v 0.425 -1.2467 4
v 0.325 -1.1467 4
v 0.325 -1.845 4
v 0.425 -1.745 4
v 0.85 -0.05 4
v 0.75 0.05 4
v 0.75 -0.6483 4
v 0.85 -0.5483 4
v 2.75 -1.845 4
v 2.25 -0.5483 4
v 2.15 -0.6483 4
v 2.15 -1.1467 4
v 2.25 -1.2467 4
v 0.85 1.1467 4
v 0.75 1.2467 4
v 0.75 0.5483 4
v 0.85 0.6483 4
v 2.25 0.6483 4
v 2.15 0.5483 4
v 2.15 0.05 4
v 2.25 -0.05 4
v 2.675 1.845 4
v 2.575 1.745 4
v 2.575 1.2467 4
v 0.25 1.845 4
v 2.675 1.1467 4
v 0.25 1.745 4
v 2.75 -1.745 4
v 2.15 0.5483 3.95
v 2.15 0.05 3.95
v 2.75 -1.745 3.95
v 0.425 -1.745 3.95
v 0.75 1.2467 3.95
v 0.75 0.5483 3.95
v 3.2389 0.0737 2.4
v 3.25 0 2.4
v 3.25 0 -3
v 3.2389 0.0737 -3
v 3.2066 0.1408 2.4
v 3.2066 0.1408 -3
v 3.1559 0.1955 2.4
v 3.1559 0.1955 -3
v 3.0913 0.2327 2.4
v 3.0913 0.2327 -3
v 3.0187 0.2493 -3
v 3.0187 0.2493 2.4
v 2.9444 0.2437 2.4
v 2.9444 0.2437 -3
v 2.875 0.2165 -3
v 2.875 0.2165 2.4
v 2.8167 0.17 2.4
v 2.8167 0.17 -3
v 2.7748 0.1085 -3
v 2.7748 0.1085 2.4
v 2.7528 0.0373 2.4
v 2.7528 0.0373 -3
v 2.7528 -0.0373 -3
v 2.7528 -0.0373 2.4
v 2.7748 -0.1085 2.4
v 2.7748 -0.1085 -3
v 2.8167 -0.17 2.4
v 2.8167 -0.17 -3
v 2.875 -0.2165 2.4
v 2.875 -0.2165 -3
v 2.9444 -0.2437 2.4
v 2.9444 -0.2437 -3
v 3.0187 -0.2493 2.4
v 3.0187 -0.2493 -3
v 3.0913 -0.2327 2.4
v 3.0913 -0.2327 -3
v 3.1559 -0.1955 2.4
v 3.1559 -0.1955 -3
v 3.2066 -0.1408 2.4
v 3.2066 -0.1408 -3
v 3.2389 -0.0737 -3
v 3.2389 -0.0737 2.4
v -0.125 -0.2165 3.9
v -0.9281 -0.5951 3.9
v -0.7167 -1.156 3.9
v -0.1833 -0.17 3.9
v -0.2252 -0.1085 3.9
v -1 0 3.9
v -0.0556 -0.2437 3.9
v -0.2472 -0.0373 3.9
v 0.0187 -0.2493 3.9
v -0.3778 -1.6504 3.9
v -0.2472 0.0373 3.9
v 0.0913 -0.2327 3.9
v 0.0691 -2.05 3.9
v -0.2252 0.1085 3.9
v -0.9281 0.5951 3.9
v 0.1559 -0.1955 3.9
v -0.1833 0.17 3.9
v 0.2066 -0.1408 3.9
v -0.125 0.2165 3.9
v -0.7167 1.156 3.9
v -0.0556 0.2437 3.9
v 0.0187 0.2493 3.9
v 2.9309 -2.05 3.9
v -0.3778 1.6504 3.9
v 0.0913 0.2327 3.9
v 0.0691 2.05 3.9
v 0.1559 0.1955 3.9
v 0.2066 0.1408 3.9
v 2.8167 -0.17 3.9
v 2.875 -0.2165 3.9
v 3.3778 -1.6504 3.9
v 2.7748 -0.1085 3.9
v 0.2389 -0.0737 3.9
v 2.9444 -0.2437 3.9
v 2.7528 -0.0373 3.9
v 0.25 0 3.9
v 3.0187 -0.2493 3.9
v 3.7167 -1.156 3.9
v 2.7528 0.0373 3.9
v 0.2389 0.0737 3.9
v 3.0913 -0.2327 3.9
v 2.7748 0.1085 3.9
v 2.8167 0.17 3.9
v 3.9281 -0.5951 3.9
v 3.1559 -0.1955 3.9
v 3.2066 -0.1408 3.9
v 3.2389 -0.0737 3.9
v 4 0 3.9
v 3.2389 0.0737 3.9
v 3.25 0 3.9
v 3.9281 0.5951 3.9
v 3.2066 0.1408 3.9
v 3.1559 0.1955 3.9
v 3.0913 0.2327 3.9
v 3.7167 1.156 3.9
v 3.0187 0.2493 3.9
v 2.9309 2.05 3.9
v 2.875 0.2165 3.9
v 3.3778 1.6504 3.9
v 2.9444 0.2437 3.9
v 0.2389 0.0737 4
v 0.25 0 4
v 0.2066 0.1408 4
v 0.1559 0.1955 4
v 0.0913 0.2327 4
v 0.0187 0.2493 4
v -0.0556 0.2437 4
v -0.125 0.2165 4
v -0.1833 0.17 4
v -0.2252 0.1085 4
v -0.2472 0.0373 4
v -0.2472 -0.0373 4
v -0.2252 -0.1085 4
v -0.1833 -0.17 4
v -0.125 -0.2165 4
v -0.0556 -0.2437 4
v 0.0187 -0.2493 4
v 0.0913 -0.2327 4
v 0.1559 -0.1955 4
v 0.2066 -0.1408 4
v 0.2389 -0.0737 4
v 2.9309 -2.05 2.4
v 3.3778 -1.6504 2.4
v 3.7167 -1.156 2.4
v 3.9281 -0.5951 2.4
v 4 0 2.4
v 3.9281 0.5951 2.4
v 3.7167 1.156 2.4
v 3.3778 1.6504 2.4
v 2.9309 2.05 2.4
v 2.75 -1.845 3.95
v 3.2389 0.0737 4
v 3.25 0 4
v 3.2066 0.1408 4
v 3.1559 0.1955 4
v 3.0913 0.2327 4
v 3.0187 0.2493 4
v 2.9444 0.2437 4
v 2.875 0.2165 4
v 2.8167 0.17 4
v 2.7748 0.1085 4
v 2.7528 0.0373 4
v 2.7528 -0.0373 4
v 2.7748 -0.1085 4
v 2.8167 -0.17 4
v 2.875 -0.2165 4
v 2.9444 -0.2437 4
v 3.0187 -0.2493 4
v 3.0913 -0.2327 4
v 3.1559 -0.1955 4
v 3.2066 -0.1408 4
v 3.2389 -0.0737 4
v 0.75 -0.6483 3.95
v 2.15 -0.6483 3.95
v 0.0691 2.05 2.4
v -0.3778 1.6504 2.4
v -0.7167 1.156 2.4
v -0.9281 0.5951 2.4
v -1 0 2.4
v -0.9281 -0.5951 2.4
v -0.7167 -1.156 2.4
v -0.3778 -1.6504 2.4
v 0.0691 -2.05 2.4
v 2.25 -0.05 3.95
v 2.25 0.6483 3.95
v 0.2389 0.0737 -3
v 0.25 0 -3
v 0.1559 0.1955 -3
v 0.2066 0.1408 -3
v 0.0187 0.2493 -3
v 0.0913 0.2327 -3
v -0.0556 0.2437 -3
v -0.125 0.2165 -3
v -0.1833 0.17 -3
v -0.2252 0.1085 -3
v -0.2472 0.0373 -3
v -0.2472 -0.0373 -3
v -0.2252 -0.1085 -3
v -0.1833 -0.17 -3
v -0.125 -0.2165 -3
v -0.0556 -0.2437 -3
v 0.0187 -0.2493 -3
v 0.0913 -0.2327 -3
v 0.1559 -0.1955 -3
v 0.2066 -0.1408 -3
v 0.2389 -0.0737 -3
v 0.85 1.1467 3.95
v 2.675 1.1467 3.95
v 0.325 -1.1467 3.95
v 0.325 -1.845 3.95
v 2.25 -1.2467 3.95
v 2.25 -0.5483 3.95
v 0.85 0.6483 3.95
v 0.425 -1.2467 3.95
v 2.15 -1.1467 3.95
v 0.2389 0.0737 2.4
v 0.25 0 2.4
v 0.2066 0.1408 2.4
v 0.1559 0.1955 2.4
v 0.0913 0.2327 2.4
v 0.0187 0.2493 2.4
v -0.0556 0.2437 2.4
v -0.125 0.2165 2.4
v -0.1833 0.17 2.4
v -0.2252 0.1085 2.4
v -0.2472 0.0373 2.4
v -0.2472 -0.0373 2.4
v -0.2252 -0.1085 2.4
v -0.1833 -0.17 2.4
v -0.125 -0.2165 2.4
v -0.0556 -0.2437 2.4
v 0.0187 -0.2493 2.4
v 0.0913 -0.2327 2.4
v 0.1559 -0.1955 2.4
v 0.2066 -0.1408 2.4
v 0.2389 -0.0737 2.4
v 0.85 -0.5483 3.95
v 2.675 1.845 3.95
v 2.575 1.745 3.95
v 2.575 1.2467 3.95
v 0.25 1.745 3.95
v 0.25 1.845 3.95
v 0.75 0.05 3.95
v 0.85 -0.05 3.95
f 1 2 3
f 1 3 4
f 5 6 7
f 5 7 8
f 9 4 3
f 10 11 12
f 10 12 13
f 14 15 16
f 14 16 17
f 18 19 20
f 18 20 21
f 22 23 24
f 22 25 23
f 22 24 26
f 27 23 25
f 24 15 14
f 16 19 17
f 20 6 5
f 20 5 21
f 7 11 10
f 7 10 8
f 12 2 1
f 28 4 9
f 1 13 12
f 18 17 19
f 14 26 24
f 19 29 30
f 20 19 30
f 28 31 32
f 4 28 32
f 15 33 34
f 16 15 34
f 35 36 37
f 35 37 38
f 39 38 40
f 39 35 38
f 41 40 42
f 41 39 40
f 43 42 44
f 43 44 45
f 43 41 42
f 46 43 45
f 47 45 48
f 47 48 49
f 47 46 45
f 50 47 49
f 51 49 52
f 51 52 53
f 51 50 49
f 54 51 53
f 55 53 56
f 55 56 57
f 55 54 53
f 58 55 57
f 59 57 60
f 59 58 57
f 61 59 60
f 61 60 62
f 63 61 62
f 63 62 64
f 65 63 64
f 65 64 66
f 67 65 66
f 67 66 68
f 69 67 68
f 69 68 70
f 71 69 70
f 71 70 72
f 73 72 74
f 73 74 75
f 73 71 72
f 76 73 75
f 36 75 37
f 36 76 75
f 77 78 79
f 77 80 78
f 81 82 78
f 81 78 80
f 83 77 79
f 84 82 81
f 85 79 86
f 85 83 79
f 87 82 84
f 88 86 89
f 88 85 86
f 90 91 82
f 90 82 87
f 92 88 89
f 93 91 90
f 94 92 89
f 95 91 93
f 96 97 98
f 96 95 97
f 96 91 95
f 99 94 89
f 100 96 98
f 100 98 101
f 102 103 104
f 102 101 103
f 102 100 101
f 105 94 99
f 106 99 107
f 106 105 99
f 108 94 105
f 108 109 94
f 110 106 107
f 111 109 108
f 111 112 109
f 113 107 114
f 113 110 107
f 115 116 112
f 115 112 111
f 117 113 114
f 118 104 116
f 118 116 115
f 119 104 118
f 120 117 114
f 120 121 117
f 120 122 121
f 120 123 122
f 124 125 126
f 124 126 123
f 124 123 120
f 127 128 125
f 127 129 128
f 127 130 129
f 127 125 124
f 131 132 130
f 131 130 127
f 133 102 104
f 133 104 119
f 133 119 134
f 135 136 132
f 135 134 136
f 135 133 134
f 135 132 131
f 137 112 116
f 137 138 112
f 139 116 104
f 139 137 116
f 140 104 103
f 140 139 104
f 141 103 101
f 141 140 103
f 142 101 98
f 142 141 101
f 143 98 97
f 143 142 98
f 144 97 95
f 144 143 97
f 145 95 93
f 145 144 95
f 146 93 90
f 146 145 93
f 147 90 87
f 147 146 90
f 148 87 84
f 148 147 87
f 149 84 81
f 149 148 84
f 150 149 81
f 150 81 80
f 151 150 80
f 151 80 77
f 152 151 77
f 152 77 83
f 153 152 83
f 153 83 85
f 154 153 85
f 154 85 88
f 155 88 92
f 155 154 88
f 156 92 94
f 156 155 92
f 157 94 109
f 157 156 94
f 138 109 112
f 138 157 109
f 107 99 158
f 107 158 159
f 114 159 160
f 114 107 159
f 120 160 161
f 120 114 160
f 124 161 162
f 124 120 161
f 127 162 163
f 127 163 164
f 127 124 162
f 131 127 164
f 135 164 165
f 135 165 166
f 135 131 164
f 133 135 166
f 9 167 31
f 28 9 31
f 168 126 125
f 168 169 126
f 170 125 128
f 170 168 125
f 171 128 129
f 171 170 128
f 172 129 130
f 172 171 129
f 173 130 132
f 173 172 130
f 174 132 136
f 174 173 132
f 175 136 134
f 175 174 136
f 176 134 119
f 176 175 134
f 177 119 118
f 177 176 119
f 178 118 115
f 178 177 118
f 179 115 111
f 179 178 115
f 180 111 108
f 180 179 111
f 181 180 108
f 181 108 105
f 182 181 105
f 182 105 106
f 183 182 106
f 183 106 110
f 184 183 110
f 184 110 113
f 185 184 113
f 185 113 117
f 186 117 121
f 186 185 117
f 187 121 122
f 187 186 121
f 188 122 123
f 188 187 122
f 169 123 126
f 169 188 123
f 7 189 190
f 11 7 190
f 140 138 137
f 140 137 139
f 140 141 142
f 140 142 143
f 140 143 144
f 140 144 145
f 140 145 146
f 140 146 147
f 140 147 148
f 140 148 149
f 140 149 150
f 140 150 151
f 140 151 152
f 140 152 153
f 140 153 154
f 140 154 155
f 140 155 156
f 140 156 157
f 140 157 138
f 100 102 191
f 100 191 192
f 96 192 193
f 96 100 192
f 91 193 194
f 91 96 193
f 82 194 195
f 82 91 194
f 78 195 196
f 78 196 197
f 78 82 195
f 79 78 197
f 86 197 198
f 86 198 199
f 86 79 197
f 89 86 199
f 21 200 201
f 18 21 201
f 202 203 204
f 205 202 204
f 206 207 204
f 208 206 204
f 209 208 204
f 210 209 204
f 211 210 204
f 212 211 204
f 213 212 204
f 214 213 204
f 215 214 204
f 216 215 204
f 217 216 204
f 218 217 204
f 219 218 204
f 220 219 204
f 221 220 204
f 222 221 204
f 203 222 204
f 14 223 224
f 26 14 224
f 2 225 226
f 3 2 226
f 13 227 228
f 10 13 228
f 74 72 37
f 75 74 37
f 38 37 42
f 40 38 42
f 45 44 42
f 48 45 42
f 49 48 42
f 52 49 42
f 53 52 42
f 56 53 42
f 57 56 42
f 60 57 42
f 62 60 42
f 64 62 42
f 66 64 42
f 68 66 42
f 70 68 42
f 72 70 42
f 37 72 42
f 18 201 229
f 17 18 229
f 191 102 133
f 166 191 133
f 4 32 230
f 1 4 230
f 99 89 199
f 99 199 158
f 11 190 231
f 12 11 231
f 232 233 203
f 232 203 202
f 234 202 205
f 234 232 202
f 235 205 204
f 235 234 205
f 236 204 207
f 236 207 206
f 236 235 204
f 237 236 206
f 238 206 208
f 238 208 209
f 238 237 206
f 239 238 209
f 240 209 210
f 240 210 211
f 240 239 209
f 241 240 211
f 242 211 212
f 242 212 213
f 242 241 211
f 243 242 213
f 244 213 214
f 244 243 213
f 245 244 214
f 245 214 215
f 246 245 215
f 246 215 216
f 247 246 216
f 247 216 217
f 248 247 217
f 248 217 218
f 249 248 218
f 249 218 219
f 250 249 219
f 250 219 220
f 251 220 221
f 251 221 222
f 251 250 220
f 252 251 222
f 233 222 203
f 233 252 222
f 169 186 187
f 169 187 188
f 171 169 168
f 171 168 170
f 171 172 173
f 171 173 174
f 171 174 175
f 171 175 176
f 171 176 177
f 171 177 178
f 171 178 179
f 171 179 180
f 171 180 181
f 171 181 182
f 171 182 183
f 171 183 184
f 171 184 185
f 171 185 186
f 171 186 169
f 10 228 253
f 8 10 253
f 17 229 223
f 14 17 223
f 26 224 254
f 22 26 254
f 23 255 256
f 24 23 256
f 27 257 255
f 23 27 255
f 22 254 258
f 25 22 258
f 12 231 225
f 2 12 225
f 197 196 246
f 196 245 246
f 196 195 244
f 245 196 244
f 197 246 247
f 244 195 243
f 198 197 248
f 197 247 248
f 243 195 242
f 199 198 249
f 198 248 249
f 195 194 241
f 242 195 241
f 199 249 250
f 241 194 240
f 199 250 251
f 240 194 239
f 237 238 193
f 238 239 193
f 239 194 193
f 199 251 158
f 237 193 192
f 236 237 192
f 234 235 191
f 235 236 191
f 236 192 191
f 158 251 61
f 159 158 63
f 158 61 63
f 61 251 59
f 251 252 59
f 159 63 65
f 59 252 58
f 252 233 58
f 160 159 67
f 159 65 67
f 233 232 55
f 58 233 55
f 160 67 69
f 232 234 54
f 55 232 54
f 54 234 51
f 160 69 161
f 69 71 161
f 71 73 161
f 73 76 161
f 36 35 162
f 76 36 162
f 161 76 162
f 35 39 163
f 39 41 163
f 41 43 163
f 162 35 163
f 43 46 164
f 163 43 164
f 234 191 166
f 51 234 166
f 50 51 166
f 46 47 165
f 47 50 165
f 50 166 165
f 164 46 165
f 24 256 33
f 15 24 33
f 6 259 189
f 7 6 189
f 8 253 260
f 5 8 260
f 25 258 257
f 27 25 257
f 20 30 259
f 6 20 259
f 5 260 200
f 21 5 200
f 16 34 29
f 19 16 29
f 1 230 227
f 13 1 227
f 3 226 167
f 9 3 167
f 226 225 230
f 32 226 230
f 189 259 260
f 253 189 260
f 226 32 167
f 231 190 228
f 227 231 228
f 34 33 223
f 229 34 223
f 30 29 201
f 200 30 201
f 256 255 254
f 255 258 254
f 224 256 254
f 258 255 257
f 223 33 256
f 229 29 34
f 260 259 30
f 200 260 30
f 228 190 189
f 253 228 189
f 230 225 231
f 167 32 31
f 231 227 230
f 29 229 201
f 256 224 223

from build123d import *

# Parameters (mm, degrees)
PAD001_DEPTH   = 1.5
SKETCH_R       = 0.25
PAD_DEPTH      = 4
PAD_DEPTH_BACK = 3
PAD002_DEPTH   = 0.05


with BuildPart() as pad001:
    # Sketch001 → Pad001 (new body)
    with BuildSketch(Plane.XY.offset(3.9)):
        with BuildLine():
            ThreePointArc((0.069091, 2.05), (-1, 0), (0.069091, -2.05))
            Line((0.069091, -2.05), (2.930909, -2.05))
            ThreePointArc((2.930909, -2.05), (4, 0), (2.930909, 2.05))
            Line((0.069091, 2.05), (2.930909, 2.05))
        make_face()
    extrude(amount=-PAD001_DEPTH)


with BuildPart() as pad:
    # Sketch → Pad (new body, two sides)
    with BuildSketch(Plane.XY) as pad_sk:
        Circle(SKETCH_R)
        with Locations((3, 0)):
            Circle(SKETCH_R)
    extrude(amount=PAD_DEPTH)
    extrude(pad_sk.sketch, amount=-PAD_DEPTH_BACK)


with BuildPart() as r_ldr_5_0x4_1mm_p3mm_vertical:
    # Sketch002 → Pad002 (new body)
    with BuildSketch(Plane.XY.offset(3.95)):
        Polygon((0.25, 1.745), (2.575, 1.745), (2.575, 1.246667), (0.75, 1.246667), (0.75, 1.146667), (0.75, 0.548333), (0.85, 0.548333), (2.15, 0.548333), (2.15, 0.05), (0.75, 0.05), (0.75, -0.05), (0.75, -0.648333), (0.85, -0.648333), (2.15, -0.648333), (2.15, -1.146667), (0.325, -1.146667), (0.325, -1.246667), (0.325, -1.845), (0.425, -1.845), (2.75, -1.845), (2.75, -1.745), (0.425, -1.745), (0.425, -1.246667), (2.15, -1.246667), (2.25, -1.246667), (2.25, -0.648333), (2.25, -0.548333), (0.85, -0.548333), (0.85, -0.05), (2.15, -0.05), (2.25, -0.05), (2.25, 0.548333), (2.25, 0.648333), (0.85, 0.648333), (0.85, 1.146667), (2.575, 1.146667), (2.675, 1.146667), (2.675, 1.745), (2.675, 1.845), (0.25, 1.845), align=None)
    extrude(amount=PAD002_DEPTH)

    # Pad002_mp_cp: union Pad001, Pad
    add(pad001.part)
    add(pad.part)


solid = r_ldr_5_0x4_1mm_p3mm_vertical.part
